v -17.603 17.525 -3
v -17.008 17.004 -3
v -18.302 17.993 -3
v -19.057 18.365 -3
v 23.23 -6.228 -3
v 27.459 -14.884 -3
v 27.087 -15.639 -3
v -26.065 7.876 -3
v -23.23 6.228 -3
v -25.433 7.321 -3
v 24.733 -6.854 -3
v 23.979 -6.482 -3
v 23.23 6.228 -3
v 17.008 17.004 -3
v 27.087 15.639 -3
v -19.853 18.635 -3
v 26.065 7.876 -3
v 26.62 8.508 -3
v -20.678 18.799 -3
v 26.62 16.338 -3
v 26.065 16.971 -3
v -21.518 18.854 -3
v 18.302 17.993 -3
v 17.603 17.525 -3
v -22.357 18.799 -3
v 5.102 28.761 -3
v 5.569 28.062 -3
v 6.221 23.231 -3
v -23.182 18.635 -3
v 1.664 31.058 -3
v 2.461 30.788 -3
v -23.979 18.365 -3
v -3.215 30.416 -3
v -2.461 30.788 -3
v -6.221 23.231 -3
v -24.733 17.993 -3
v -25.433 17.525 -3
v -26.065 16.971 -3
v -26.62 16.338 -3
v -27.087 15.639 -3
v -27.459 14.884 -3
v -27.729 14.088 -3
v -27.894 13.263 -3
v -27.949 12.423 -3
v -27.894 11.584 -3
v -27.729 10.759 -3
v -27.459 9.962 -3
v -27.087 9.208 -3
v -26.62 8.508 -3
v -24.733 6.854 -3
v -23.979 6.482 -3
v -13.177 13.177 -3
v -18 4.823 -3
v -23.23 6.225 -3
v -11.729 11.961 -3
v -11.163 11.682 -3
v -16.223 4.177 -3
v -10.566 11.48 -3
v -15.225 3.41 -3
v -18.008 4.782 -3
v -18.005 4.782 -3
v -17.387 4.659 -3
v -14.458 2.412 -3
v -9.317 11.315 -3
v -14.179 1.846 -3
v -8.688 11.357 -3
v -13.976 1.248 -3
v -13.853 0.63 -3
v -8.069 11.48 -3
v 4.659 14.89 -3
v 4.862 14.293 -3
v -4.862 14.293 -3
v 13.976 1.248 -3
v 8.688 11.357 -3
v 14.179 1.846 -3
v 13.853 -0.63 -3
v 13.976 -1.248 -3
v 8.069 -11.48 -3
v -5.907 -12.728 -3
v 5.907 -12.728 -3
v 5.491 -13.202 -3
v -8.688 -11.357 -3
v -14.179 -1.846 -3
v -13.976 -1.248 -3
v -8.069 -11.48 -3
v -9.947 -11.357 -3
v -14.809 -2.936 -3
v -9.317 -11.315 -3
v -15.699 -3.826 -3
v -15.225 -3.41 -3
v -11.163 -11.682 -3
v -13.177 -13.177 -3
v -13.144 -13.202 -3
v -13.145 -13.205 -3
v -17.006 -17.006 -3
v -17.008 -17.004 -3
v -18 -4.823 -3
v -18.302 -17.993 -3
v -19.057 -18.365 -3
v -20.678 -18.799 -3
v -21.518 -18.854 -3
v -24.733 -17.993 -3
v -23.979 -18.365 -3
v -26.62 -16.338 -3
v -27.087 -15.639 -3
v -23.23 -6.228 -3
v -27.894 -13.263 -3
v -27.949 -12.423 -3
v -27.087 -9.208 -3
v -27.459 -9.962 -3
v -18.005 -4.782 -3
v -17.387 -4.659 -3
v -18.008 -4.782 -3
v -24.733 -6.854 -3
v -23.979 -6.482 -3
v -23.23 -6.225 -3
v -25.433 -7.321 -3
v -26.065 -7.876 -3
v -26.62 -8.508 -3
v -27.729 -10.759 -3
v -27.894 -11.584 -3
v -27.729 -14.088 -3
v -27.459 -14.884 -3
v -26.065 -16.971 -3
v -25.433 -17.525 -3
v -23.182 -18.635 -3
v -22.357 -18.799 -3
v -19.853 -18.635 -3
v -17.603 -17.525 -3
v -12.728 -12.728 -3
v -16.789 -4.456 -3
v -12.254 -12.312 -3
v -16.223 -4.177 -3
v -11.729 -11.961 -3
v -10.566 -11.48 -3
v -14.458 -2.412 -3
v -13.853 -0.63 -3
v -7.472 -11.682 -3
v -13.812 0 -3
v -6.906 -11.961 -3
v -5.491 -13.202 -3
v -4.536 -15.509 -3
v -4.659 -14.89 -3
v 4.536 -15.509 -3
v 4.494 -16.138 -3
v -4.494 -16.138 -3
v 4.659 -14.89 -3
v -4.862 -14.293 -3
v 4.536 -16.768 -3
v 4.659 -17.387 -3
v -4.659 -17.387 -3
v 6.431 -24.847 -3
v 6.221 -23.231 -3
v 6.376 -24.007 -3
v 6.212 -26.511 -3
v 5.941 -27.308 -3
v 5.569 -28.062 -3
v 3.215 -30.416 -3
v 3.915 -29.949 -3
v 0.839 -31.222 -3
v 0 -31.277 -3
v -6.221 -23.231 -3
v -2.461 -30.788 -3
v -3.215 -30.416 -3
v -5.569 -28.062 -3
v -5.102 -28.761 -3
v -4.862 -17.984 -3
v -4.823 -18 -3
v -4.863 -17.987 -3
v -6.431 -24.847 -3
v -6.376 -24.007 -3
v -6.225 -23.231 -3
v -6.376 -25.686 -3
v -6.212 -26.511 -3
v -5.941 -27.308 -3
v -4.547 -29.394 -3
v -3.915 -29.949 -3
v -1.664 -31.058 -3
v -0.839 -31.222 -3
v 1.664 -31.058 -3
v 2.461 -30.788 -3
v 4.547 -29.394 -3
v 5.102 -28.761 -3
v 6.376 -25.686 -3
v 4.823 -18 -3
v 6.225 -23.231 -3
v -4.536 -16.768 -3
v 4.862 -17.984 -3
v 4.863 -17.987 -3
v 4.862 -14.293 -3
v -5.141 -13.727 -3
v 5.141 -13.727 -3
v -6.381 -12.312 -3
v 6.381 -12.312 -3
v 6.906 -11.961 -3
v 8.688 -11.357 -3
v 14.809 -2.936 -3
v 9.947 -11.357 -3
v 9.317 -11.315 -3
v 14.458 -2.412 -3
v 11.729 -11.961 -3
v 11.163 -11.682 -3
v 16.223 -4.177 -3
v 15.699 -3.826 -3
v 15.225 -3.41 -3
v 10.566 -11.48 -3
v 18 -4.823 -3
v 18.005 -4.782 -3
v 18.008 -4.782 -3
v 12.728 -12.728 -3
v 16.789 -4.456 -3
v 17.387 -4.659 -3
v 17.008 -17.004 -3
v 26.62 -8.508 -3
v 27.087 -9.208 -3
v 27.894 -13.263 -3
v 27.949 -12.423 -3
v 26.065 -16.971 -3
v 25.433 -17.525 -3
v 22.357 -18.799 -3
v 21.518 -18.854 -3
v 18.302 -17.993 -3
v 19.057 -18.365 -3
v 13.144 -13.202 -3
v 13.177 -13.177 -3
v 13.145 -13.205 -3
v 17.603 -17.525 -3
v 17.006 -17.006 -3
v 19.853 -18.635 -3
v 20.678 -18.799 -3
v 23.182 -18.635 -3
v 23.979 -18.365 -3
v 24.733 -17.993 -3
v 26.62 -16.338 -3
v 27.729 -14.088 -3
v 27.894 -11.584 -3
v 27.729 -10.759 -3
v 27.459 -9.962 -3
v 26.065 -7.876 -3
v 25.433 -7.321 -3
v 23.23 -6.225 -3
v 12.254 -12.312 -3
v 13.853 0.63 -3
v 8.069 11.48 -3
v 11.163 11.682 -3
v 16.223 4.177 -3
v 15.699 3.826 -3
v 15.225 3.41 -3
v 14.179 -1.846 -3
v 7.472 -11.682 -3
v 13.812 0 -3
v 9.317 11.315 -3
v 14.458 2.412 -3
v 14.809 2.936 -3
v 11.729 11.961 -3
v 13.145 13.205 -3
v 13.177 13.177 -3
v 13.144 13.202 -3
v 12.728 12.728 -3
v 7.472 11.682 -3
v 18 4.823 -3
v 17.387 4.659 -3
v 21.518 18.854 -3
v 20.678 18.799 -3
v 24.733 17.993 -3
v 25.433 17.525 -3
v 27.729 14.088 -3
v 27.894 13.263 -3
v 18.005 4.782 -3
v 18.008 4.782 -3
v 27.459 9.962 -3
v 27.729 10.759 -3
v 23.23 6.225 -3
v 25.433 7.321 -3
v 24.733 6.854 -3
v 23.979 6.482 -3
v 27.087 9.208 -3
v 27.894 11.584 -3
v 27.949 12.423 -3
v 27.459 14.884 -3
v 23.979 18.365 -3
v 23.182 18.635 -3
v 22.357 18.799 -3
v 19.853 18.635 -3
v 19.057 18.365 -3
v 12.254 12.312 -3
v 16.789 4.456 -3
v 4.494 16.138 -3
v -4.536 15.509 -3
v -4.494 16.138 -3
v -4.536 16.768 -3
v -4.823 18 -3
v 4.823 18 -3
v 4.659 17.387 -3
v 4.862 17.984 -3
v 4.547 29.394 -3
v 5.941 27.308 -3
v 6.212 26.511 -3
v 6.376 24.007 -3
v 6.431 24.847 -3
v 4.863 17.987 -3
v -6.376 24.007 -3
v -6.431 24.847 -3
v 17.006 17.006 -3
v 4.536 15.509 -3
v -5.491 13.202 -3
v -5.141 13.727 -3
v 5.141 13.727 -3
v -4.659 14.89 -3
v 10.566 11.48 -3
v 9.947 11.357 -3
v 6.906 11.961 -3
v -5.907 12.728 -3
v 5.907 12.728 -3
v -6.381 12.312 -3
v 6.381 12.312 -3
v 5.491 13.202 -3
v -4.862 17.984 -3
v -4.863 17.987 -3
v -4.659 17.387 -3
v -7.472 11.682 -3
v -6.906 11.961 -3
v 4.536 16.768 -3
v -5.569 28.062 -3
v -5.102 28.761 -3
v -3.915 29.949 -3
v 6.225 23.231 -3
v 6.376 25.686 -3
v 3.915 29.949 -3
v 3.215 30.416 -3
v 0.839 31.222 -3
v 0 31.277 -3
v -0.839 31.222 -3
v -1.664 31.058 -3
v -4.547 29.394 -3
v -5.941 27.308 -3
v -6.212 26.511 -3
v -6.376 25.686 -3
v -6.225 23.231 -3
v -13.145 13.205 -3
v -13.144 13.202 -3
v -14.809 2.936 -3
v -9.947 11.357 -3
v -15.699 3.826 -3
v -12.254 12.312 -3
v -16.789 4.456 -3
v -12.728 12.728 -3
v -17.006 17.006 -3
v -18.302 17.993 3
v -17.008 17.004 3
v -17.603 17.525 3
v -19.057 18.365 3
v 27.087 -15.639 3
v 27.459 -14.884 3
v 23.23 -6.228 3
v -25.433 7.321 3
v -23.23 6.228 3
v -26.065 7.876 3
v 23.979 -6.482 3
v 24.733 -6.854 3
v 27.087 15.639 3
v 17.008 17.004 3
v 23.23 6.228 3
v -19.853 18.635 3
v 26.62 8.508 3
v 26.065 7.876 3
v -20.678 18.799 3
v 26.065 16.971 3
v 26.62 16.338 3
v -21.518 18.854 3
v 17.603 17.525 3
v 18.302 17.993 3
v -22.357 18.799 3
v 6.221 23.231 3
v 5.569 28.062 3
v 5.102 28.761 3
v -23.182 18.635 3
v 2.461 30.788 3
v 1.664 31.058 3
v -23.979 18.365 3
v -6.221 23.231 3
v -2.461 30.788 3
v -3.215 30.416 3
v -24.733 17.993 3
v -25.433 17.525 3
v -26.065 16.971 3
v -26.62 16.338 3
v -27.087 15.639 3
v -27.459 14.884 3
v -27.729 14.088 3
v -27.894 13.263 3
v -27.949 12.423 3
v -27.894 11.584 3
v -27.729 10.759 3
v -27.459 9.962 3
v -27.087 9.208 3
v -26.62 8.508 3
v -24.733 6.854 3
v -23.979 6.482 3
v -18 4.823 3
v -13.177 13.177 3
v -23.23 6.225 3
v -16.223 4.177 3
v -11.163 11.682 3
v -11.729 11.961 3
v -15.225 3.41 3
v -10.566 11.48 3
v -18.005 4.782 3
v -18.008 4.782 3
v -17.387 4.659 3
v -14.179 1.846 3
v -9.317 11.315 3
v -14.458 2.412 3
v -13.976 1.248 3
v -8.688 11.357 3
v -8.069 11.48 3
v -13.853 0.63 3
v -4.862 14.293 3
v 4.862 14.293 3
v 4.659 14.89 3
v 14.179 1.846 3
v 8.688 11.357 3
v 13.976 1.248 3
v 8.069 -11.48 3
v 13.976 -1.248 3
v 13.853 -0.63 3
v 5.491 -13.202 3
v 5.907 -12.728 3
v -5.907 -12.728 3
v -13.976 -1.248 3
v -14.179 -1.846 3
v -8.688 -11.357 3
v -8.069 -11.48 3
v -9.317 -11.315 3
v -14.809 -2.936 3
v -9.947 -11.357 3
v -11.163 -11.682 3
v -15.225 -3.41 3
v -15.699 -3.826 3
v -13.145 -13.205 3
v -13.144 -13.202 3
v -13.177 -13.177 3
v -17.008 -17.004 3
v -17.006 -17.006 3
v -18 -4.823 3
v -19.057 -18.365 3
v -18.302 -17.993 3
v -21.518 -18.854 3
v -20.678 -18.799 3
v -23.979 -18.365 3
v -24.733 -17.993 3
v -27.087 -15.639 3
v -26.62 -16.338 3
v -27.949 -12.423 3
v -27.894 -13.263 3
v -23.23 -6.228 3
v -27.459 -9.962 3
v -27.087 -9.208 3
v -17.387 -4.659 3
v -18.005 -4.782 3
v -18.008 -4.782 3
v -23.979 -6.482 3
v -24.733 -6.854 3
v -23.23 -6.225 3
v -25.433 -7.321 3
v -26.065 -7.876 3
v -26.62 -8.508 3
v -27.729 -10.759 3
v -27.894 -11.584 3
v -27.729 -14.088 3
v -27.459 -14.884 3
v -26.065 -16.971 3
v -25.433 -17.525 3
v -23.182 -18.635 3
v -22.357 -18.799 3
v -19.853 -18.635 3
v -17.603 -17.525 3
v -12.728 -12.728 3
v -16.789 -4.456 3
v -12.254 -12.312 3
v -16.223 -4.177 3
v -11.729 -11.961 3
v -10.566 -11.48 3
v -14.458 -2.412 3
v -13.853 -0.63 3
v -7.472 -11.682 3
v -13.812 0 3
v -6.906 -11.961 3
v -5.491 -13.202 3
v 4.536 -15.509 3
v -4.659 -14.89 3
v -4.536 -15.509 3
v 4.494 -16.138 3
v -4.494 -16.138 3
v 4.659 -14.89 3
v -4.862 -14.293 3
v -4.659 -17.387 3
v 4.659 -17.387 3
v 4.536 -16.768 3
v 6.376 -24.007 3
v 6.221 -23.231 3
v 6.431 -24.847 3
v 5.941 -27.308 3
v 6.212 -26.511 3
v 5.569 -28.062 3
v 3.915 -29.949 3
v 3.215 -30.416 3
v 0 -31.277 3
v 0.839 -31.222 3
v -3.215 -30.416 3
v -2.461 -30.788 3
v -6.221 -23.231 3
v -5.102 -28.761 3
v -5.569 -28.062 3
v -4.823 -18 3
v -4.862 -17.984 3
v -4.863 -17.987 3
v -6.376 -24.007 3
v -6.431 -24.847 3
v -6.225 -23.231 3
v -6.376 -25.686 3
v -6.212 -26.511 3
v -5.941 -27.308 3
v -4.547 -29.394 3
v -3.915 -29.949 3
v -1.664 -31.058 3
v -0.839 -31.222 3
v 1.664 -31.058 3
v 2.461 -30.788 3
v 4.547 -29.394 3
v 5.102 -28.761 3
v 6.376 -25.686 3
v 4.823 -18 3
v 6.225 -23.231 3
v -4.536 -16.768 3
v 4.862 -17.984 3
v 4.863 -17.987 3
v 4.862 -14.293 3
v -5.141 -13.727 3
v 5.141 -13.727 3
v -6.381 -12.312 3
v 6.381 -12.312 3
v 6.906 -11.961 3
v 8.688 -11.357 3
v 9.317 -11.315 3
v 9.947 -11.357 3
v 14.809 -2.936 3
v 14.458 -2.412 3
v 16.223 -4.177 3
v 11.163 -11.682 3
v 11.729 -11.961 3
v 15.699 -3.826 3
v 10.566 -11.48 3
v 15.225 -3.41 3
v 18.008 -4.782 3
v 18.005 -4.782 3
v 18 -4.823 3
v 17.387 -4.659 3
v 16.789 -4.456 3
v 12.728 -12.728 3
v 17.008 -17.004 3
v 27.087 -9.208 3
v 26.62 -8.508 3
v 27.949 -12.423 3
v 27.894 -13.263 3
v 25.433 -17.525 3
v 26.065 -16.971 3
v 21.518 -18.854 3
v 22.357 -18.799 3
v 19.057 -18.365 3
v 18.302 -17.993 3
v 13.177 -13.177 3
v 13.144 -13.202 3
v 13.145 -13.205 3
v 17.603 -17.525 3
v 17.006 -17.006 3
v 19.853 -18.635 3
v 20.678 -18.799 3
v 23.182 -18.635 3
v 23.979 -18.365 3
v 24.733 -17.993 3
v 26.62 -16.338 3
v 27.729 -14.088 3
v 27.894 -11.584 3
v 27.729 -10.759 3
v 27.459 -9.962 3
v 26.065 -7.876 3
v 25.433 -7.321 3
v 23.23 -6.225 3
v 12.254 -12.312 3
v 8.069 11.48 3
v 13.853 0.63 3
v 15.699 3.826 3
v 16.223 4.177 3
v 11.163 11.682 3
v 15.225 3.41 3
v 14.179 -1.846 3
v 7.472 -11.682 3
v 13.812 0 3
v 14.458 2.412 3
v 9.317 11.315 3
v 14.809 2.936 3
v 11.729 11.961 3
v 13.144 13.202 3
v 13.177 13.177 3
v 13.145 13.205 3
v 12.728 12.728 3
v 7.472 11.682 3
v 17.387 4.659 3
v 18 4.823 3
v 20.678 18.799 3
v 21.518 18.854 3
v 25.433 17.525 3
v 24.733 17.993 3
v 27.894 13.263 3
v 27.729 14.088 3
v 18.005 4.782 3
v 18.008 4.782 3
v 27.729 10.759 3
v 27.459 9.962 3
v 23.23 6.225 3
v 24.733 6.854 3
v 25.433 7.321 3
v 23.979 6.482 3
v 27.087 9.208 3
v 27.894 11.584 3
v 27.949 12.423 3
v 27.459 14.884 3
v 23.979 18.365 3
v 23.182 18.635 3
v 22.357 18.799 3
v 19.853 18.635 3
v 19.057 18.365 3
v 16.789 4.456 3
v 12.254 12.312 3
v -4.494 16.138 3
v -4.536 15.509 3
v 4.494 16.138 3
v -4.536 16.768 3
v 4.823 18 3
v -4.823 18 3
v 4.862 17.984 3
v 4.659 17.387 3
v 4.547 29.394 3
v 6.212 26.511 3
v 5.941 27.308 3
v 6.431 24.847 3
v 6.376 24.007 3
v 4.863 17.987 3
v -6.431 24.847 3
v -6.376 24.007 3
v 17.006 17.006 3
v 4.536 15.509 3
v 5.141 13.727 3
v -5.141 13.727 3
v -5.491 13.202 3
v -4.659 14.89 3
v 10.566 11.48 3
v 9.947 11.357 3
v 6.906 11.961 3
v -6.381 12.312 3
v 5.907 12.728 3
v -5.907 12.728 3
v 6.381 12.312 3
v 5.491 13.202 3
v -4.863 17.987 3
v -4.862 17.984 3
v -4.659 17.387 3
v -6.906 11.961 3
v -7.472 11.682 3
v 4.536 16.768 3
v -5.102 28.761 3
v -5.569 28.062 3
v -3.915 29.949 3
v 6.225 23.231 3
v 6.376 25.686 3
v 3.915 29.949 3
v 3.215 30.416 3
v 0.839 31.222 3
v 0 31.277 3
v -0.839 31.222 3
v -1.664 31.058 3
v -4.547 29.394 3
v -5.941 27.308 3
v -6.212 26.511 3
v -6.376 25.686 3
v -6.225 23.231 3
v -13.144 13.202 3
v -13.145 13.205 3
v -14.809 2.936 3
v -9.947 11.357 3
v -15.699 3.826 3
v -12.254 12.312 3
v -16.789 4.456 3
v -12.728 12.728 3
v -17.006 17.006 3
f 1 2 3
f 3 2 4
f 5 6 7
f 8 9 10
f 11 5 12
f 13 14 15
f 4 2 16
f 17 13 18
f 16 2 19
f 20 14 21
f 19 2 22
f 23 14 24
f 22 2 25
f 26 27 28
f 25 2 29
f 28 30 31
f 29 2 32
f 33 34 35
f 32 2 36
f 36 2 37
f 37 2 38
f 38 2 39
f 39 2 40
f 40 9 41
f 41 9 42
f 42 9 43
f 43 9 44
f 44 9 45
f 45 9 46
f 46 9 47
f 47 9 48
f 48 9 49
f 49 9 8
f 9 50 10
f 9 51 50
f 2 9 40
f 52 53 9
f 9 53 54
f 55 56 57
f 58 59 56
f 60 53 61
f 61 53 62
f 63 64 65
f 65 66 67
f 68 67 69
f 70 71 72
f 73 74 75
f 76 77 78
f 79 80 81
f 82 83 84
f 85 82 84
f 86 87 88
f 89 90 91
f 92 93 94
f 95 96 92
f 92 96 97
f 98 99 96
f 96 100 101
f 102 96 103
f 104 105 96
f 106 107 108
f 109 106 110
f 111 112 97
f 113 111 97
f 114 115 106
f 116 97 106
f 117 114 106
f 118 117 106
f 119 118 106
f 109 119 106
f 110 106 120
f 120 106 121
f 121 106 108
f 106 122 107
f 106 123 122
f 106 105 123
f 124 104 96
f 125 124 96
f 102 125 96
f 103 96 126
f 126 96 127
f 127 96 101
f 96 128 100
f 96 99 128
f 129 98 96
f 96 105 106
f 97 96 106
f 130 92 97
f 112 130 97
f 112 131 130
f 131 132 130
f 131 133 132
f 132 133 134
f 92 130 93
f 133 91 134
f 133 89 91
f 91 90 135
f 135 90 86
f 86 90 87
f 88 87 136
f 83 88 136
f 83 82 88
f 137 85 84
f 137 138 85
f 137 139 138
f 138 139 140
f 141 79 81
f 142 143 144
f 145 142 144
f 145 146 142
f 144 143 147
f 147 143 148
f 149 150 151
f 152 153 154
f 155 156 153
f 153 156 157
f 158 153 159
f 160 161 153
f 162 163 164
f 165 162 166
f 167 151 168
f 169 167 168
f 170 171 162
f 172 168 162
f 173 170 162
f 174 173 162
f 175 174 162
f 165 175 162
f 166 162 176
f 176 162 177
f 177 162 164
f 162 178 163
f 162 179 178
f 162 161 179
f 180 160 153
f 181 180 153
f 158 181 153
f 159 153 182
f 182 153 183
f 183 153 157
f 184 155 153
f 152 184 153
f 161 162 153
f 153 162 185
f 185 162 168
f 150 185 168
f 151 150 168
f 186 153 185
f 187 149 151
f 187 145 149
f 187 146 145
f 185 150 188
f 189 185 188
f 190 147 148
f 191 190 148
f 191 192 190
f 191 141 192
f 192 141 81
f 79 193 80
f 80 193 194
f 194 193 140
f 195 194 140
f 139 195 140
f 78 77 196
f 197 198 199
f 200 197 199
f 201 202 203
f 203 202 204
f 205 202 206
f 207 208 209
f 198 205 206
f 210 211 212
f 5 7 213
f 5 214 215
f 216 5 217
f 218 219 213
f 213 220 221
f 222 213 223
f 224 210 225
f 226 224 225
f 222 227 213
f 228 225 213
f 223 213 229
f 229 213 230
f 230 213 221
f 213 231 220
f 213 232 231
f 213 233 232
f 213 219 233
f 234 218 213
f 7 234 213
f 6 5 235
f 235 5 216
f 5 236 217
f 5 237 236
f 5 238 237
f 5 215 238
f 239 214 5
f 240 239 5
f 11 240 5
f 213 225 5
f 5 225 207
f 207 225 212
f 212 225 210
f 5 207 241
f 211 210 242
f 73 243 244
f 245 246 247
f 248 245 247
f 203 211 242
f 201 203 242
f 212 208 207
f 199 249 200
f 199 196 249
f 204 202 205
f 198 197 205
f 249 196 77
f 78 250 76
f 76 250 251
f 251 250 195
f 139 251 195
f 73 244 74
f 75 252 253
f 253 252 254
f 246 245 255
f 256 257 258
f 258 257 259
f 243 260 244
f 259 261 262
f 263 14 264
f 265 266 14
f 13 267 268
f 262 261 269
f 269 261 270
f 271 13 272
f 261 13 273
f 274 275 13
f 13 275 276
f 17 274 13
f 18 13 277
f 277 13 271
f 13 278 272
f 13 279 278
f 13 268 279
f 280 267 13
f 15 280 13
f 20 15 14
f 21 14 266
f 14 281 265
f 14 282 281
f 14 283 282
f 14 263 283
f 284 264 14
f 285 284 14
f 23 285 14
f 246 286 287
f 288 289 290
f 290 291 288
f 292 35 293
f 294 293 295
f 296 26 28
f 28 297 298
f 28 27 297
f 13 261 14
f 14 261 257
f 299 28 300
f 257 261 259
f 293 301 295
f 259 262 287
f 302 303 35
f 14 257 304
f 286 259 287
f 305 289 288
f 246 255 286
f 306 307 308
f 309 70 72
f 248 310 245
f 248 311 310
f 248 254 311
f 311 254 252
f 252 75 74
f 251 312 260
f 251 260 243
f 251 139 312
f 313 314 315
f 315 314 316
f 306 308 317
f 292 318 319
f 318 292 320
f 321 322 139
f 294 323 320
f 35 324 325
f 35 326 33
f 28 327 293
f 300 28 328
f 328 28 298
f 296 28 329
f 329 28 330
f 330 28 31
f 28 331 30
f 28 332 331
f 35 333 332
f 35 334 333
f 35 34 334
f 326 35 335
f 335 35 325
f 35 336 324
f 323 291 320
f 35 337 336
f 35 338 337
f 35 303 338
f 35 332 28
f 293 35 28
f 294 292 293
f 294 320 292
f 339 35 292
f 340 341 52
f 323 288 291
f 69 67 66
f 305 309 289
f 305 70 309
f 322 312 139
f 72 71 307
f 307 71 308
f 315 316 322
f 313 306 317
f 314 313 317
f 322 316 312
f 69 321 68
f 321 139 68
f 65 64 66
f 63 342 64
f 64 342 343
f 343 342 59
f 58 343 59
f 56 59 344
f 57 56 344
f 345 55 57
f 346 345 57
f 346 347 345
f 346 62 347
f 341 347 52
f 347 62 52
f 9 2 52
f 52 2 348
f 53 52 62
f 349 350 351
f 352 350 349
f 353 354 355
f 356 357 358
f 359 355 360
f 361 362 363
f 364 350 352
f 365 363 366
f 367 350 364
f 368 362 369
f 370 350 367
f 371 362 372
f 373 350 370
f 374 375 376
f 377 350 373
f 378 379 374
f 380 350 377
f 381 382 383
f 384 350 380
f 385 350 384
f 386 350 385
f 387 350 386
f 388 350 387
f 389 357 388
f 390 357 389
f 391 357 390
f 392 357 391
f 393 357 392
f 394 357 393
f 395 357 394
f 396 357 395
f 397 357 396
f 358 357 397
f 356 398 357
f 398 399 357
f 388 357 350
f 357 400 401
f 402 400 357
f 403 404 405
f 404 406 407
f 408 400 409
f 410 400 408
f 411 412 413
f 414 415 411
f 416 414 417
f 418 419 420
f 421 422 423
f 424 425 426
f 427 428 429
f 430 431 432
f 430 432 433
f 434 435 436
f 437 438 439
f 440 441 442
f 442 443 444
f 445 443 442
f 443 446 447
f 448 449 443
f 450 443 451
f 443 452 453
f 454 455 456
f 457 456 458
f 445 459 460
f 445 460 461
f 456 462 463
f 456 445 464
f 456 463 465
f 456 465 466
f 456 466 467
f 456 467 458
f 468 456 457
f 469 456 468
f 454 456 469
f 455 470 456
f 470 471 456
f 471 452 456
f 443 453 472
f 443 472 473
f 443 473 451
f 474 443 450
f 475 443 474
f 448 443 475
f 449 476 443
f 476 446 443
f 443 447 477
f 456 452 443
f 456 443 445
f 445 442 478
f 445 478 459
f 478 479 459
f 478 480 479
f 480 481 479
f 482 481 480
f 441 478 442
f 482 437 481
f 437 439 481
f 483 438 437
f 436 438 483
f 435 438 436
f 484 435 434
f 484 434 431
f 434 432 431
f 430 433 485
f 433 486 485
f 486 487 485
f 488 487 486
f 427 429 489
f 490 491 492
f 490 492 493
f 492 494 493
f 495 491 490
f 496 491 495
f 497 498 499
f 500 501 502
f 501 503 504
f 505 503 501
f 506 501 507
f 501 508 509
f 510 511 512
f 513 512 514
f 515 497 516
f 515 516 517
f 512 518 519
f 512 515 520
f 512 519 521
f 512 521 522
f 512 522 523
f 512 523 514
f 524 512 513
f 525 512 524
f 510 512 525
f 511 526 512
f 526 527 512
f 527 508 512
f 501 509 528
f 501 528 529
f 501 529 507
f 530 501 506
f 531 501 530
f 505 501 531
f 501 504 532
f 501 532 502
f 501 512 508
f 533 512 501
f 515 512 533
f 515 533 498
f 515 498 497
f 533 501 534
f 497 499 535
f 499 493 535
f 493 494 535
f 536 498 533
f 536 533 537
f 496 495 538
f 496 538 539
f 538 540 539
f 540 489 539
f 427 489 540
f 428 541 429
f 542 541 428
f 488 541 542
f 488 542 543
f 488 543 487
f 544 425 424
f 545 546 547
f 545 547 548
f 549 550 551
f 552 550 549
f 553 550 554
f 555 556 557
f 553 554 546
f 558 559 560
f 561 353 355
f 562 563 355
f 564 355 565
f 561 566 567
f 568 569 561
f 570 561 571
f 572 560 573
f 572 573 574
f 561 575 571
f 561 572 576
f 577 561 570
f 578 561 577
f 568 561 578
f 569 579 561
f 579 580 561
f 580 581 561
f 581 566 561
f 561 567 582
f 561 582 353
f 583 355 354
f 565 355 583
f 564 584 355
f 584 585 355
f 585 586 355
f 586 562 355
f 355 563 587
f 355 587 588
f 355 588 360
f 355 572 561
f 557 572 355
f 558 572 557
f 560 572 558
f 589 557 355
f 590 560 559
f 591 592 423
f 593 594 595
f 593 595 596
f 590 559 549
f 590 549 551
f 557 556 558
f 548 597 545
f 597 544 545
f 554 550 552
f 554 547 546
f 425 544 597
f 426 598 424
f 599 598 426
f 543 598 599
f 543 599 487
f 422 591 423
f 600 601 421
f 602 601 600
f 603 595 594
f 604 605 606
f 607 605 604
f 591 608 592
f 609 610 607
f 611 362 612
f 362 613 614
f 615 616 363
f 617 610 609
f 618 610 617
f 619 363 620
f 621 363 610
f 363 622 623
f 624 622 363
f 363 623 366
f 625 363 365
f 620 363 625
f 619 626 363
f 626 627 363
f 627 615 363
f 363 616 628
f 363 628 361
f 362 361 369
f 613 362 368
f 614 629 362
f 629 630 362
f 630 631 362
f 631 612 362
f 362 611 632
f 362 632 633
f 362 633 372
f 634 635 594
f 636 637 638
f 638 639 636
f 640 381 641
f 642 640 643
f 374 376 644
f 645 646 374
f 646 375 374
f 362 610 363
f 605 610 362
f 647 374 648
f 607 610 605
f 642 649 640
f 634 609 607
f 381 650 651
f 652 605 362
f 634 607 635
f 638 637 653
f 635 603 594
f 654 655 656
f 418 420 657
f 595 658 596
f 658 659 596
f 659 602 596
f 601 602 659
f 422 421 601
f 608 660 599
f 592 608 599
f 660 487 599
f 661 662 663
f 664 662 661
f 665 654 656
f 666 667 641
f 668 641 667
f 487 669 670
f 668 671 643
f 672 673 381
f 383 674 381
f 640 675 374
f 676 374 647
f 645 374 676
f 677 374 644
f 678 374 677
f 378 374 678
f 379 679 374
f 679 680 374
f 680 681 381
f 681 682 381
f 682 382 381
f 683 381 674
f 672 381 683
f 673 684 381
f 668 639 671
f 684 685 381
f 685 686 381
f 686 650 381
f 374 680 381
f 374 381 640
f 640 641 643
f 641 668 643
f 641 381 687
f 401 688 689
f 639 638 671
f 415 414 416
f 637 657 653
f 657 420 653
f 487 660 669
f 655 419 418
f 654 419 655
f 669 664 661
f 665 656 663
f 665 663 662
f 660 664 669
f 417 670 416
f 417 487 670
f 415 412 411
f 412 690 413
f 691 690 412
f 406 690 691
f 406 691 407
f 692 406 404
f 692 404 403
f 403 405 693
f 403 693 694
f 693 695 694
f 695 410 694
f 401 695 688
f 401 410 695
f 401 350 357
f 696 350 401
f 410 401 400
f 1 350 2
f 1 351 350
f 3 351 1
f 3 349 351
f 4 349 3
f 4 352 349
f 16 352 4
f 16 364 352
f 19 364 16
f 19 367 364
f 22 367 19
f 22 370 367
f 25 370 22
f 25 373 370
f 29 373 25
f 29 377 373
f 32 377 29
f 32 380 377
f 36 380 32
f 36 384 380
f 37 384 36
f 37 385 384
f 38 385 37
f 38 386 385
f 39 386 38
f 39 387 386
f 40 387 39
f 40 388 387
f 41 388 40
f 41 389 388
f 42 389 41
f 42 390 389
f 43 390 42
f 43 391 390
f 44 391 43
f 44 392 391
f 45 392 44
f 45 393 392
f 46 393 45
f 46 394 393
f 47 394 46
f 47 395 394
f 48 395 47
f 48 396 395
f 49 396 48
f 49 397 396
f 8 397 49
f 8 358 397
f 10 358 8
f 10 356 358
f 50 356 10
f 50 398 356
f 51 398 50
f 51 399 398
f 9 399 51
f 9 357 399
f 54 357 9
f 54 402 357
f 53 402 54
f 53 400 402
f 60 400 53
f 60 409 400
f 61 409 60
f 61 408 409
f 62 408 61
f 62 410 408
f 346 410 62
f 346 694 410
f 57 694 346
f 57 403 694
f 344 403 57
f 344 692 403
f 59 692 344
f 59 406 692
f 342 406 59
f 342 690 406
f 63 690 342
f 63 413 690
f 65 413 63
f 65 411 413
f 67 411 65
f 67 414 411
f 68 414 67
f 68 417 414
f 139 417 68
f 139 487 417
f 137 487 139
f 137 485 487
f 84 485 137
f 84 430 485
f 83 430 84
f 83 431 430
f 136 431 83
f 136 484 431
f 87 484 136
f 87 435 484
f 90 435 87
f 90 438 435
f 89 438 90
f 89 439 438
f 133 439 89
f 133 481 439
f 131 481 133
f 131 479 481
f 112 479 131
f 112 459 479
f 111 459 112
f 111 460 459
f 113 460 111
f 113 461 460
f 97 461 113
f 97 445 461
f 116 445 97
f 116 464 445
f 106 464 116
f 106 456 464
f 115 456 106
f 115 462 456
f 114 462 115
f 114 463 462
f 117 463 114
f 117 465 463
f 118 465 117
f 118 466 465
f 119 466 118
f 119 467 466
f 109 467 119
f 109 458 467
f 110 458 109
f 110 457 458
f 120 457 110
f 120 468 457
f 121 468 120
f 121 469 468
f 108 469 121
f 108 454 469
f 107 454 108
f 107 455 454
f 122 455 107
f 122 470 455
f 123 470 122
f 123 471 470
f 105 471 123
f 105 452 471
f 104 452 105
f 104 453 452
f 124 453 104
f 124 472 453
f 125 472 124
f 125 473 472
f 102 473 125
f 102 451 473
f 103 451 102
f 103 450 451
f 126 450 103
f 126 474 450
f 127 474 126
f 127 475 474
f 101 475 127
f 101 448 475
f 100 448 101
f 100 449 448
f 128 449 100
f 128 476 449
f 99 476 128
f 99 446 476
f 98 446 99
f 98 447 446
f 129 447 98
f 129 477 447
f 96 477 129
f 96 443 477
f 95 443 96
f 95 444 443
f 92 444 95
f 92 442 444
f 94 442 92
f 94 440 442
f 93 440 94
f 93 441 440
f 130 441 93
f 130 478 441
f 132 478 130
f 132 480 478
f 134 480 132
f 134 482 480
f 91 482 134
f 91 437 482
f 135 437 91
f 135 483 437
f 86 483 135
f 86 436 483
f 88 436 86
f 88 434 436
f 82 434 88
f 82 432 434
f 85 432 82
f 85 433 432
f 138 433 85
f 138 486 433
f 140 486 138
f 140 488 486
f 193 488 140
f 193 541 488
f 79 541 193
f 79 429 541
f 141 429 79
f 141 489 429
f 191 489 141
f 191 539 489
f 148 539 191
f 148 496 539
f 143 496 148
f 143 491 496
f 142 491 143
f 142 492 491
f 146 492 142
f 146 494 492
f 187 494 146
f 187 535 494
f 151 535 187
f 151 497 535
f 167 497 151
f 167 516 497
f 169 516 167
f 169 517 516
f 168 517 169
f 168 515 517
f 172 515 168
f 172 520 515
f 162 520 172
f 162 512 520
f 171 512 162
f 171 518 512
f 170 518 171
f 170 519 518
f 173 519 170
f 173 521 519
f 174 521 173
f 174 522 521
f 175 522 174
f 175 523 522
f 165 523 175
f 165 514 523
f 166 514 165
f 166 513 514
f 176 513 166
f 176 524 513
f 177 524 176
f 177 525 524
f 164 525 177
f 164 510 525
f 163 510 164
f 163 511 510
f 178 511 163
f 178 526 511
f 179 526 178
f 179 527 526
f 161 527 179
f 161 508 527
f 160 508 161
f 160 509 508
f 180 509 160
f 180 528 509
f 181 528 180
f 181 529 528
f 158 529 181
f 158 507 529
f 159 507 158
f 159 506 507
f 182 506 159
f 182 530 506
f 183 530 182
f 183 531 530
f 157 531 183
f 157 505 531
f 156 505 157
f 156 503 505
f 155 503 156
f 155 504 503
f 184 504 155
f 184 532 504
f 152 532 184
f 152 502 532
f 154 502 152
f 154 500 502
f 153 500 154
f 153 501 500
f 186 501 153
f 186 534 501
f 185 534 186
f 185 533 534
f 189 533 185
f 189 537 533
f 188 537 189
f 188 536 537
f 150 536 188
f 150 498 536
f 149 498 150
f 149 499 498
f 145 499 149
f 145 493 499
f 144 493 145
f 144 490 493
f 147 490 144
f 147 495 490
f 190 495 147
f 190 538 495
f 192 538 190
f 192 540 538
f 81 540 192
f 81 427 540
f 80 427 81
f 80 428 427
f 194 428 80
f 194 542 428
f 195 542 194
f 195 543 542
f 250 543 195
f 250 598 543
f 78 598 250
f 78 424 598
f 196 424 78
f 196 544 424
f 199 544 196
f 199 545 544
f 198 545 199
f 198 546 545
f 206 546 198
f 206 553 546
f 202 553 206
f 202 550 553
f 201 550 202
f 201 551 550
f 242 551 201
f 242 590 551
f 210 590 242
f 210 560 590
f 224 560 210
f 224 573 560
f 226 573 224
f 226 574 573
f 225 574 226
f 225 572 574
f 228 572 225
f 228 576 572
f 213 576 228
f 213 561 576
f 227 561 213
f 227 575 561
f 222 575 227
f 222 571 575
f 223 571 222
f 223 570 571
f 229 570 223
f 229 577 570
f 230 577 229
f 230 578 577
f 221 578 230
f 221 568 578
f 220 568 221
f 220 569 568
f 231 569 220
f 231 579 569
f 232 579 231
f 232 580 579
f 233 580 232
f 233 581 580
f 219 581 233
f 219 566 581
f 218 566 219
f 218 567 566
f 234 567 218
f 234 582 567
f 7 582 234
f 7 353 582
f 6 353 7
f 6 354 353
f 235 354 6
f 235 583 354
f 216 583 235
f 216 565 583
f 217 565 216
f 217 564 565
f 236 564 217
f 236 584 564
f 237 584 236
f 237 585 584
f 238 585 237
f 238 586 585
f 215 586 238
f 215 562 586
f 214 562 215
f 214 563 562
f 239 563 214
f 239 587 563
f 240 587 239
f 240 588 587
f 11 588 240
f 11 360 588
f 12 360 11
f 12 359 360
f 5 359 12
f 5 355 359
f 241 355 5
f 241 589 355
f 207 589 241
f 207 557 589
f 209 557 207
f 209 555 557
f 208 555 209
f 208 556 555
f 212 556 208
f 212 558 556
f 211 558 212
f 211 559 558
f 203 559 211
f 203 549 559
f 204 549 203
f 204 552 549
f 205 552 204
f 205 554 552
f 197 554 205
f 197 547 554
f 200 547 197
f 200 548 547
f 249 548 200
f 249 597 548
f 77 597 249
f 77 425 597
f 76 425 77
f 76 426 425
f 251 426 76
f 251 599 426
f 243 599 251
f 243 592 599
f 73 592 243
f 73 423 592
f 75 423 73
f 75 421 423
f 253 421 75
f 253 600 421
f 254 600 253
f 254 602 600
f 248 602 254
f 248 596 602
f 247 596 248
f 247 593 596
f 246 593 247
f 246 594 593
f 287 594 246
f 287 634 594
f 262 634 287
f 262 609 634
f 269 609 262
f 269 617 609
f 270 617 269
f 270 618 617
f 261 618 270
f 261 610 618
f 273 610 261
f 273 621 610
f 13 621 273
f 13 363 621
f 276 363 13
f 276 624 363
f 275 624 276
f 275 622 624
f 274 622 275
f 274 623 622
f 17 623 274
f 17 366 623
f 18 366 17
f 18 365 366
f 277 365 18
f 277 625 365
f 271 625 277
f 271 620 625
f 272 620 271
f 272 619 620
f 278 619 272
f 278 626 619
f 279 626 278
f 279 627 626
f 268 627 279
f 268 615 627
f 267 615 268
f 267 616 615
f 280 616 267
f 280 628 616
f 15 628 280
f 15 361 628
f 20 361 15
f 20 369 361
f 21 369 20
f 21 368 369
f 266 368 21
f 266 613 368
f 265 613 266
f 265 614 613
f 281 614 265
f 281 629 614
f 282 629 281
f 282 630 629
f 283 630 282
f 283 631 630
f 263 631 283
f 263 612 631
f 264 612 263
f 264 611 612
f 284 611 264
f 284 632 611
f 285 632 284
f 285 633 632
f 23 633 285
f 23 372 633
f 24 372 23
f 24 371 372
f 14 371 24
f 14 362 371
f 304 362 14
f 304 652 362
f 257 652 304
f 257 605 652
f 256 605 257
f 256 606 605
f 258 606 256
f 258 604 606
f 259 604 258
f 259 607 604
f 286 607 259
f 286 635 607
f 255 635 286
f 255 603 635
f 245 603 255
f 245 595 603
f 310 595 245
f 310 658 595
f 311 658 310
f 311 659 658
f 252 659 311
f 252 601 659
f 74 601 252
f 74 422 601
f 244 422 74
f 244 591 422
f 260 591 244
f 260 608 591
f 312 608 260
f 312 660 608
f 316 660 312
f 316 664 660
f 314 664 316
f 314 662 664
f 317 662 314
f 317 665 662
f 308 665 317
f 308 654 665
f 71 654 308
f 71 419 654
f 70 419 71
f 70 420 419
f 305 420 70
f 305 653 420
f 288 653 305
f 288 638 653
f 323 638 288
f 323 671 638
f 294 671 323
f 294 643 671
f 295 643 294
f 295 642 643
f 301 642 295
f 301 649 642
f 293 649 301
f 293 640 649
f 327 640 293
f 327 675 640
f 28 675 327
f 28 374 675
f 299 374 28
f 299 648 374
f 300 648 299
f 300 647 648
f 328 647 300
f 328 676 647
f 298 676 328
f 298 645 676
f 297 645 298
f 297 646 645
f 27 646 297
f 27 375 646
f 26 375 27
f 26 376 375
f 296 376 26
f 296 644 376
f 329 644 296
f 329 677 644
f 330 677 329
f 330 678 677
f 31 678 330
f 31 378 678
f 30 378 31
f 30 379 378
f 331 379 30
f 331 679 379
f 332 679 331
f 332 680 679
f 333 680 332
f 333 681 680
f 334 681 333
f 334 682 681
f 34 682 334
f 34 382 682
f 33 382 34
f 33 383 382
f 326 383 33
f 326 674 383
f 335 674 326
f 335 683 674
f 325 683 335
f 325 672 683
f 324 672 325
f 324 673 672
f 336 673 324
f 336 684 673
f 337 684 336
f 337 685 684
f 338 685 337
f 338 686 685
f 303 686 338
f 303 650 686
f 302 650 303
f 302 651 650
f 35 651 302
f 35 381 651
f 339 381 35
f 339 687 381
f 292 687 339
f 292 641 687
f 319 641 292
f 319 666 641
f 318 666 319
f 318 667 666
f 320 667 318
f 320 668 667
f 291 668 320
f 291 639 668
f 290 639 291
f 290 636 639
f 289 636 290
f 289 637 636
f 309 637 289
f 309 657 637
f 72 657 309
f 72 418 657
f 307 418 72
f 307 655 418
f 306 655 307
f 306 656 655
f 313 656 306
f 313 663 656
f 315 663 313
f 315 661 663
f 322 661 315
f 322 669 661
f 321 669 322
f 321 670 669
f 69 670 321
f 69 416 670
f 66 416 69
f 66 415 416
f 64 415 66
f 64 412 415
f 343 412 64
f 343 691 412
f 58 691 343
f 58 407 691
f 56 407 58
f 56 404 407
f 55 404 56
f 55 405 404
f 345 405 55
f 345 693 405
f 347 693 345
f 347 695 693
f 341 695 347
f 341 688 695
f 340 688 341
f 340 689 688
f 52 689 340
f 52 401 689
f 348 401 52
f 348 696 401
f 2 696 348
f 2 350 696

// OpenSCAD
// [FL_INDEX: keywords="openscad, 3d_parametric, Customizable_Stretchy_Shape, csg_solid" | COT="Parametric OpenSCAD design from 3DCodeverse"]
// Title: Customizable Stretchy Shape

// stretchy bands

// (not including the curved parts)
_1_insideDiameter = 36; //[1:300]

// (not including the curved parts)
_2_outsideDiameter = 48; //[1:300]

_3_height = 6; //[1:100]

// number of loops around the ring
_4_radialCount = 6; //[2:60]

// twist
_5_twist = 0.0;

// number of slices per mm
_6_slices = 1;

// (of the arcs)
_7_resolution = 48; //[24:Low, 36:Medium, 48:High, 64:VeryHigh]



linear_extrude( height = _3_height,
	center = true,
	convexity = _4_radialCount,
	twist = _5_twist,
	slices = _5_twist == 0 ? 1 : max(1,_6_slices*_3_height) )

	stretchyShape(	_1_insideDiameter > _2_outsideDiameter ? _2_outsideDiameter/2 : _1_insideDiameter/2, 
					_2_outsideDiameter/2, 
					_4_radialCount, 
					0, 
					$fn=_7_resolution
);


module stretchyShape(r1, r2, count, thickness) {

	angle = 180/count;
	eps = 0.1;
	overlap = 2;

	cord2 = 2 * r2 * sin(angle/2);
	outsideArc = 180 + angle + overlap;
	outsideRadius = cord2/sin(90-angle/2)/2;
	outsideOffset = r2 * cos(angle/2) + cos(90-angle/2) * outsideRadius;

	insideArc = 180 - angle + overlap;
	cord1 = 2 * r1 * sin(angle/2);
	insideRadius = cord1/sin(90-angle/2)/2;
	insideOffset = r1 * cos(angle/2) + cos(90-angle/2) * insideRadius;

	union()
	{
		for(a = [0:angle*2:360])
			rotate([0,0,a])
				for(b=[0,angle])
					rotate([0,0,angle/2 - b])
						translate( [(b==0?+1:-1)*insideRadius,r1 + (r2-r1)/2,0] )
							square( [insideRadius*2+thickness, r2 - r1 + eps], center=true);

	for(a = [0:angle*2:360])
		rotate([0,0,a])
			translate([0,outsideOffset,0])
				circle( r = outsideRadius+thickness/2, center = true );
	
	difference()
	{
		circle( r = insideOffset, center = true );	
		for(a = [0:angle*2:360])
			rotate([0,0,a+angle])
				translate([0,insideOffset,0])
					circle(r = insideRadius-thickness/2, center = true );
	}
	}
}
